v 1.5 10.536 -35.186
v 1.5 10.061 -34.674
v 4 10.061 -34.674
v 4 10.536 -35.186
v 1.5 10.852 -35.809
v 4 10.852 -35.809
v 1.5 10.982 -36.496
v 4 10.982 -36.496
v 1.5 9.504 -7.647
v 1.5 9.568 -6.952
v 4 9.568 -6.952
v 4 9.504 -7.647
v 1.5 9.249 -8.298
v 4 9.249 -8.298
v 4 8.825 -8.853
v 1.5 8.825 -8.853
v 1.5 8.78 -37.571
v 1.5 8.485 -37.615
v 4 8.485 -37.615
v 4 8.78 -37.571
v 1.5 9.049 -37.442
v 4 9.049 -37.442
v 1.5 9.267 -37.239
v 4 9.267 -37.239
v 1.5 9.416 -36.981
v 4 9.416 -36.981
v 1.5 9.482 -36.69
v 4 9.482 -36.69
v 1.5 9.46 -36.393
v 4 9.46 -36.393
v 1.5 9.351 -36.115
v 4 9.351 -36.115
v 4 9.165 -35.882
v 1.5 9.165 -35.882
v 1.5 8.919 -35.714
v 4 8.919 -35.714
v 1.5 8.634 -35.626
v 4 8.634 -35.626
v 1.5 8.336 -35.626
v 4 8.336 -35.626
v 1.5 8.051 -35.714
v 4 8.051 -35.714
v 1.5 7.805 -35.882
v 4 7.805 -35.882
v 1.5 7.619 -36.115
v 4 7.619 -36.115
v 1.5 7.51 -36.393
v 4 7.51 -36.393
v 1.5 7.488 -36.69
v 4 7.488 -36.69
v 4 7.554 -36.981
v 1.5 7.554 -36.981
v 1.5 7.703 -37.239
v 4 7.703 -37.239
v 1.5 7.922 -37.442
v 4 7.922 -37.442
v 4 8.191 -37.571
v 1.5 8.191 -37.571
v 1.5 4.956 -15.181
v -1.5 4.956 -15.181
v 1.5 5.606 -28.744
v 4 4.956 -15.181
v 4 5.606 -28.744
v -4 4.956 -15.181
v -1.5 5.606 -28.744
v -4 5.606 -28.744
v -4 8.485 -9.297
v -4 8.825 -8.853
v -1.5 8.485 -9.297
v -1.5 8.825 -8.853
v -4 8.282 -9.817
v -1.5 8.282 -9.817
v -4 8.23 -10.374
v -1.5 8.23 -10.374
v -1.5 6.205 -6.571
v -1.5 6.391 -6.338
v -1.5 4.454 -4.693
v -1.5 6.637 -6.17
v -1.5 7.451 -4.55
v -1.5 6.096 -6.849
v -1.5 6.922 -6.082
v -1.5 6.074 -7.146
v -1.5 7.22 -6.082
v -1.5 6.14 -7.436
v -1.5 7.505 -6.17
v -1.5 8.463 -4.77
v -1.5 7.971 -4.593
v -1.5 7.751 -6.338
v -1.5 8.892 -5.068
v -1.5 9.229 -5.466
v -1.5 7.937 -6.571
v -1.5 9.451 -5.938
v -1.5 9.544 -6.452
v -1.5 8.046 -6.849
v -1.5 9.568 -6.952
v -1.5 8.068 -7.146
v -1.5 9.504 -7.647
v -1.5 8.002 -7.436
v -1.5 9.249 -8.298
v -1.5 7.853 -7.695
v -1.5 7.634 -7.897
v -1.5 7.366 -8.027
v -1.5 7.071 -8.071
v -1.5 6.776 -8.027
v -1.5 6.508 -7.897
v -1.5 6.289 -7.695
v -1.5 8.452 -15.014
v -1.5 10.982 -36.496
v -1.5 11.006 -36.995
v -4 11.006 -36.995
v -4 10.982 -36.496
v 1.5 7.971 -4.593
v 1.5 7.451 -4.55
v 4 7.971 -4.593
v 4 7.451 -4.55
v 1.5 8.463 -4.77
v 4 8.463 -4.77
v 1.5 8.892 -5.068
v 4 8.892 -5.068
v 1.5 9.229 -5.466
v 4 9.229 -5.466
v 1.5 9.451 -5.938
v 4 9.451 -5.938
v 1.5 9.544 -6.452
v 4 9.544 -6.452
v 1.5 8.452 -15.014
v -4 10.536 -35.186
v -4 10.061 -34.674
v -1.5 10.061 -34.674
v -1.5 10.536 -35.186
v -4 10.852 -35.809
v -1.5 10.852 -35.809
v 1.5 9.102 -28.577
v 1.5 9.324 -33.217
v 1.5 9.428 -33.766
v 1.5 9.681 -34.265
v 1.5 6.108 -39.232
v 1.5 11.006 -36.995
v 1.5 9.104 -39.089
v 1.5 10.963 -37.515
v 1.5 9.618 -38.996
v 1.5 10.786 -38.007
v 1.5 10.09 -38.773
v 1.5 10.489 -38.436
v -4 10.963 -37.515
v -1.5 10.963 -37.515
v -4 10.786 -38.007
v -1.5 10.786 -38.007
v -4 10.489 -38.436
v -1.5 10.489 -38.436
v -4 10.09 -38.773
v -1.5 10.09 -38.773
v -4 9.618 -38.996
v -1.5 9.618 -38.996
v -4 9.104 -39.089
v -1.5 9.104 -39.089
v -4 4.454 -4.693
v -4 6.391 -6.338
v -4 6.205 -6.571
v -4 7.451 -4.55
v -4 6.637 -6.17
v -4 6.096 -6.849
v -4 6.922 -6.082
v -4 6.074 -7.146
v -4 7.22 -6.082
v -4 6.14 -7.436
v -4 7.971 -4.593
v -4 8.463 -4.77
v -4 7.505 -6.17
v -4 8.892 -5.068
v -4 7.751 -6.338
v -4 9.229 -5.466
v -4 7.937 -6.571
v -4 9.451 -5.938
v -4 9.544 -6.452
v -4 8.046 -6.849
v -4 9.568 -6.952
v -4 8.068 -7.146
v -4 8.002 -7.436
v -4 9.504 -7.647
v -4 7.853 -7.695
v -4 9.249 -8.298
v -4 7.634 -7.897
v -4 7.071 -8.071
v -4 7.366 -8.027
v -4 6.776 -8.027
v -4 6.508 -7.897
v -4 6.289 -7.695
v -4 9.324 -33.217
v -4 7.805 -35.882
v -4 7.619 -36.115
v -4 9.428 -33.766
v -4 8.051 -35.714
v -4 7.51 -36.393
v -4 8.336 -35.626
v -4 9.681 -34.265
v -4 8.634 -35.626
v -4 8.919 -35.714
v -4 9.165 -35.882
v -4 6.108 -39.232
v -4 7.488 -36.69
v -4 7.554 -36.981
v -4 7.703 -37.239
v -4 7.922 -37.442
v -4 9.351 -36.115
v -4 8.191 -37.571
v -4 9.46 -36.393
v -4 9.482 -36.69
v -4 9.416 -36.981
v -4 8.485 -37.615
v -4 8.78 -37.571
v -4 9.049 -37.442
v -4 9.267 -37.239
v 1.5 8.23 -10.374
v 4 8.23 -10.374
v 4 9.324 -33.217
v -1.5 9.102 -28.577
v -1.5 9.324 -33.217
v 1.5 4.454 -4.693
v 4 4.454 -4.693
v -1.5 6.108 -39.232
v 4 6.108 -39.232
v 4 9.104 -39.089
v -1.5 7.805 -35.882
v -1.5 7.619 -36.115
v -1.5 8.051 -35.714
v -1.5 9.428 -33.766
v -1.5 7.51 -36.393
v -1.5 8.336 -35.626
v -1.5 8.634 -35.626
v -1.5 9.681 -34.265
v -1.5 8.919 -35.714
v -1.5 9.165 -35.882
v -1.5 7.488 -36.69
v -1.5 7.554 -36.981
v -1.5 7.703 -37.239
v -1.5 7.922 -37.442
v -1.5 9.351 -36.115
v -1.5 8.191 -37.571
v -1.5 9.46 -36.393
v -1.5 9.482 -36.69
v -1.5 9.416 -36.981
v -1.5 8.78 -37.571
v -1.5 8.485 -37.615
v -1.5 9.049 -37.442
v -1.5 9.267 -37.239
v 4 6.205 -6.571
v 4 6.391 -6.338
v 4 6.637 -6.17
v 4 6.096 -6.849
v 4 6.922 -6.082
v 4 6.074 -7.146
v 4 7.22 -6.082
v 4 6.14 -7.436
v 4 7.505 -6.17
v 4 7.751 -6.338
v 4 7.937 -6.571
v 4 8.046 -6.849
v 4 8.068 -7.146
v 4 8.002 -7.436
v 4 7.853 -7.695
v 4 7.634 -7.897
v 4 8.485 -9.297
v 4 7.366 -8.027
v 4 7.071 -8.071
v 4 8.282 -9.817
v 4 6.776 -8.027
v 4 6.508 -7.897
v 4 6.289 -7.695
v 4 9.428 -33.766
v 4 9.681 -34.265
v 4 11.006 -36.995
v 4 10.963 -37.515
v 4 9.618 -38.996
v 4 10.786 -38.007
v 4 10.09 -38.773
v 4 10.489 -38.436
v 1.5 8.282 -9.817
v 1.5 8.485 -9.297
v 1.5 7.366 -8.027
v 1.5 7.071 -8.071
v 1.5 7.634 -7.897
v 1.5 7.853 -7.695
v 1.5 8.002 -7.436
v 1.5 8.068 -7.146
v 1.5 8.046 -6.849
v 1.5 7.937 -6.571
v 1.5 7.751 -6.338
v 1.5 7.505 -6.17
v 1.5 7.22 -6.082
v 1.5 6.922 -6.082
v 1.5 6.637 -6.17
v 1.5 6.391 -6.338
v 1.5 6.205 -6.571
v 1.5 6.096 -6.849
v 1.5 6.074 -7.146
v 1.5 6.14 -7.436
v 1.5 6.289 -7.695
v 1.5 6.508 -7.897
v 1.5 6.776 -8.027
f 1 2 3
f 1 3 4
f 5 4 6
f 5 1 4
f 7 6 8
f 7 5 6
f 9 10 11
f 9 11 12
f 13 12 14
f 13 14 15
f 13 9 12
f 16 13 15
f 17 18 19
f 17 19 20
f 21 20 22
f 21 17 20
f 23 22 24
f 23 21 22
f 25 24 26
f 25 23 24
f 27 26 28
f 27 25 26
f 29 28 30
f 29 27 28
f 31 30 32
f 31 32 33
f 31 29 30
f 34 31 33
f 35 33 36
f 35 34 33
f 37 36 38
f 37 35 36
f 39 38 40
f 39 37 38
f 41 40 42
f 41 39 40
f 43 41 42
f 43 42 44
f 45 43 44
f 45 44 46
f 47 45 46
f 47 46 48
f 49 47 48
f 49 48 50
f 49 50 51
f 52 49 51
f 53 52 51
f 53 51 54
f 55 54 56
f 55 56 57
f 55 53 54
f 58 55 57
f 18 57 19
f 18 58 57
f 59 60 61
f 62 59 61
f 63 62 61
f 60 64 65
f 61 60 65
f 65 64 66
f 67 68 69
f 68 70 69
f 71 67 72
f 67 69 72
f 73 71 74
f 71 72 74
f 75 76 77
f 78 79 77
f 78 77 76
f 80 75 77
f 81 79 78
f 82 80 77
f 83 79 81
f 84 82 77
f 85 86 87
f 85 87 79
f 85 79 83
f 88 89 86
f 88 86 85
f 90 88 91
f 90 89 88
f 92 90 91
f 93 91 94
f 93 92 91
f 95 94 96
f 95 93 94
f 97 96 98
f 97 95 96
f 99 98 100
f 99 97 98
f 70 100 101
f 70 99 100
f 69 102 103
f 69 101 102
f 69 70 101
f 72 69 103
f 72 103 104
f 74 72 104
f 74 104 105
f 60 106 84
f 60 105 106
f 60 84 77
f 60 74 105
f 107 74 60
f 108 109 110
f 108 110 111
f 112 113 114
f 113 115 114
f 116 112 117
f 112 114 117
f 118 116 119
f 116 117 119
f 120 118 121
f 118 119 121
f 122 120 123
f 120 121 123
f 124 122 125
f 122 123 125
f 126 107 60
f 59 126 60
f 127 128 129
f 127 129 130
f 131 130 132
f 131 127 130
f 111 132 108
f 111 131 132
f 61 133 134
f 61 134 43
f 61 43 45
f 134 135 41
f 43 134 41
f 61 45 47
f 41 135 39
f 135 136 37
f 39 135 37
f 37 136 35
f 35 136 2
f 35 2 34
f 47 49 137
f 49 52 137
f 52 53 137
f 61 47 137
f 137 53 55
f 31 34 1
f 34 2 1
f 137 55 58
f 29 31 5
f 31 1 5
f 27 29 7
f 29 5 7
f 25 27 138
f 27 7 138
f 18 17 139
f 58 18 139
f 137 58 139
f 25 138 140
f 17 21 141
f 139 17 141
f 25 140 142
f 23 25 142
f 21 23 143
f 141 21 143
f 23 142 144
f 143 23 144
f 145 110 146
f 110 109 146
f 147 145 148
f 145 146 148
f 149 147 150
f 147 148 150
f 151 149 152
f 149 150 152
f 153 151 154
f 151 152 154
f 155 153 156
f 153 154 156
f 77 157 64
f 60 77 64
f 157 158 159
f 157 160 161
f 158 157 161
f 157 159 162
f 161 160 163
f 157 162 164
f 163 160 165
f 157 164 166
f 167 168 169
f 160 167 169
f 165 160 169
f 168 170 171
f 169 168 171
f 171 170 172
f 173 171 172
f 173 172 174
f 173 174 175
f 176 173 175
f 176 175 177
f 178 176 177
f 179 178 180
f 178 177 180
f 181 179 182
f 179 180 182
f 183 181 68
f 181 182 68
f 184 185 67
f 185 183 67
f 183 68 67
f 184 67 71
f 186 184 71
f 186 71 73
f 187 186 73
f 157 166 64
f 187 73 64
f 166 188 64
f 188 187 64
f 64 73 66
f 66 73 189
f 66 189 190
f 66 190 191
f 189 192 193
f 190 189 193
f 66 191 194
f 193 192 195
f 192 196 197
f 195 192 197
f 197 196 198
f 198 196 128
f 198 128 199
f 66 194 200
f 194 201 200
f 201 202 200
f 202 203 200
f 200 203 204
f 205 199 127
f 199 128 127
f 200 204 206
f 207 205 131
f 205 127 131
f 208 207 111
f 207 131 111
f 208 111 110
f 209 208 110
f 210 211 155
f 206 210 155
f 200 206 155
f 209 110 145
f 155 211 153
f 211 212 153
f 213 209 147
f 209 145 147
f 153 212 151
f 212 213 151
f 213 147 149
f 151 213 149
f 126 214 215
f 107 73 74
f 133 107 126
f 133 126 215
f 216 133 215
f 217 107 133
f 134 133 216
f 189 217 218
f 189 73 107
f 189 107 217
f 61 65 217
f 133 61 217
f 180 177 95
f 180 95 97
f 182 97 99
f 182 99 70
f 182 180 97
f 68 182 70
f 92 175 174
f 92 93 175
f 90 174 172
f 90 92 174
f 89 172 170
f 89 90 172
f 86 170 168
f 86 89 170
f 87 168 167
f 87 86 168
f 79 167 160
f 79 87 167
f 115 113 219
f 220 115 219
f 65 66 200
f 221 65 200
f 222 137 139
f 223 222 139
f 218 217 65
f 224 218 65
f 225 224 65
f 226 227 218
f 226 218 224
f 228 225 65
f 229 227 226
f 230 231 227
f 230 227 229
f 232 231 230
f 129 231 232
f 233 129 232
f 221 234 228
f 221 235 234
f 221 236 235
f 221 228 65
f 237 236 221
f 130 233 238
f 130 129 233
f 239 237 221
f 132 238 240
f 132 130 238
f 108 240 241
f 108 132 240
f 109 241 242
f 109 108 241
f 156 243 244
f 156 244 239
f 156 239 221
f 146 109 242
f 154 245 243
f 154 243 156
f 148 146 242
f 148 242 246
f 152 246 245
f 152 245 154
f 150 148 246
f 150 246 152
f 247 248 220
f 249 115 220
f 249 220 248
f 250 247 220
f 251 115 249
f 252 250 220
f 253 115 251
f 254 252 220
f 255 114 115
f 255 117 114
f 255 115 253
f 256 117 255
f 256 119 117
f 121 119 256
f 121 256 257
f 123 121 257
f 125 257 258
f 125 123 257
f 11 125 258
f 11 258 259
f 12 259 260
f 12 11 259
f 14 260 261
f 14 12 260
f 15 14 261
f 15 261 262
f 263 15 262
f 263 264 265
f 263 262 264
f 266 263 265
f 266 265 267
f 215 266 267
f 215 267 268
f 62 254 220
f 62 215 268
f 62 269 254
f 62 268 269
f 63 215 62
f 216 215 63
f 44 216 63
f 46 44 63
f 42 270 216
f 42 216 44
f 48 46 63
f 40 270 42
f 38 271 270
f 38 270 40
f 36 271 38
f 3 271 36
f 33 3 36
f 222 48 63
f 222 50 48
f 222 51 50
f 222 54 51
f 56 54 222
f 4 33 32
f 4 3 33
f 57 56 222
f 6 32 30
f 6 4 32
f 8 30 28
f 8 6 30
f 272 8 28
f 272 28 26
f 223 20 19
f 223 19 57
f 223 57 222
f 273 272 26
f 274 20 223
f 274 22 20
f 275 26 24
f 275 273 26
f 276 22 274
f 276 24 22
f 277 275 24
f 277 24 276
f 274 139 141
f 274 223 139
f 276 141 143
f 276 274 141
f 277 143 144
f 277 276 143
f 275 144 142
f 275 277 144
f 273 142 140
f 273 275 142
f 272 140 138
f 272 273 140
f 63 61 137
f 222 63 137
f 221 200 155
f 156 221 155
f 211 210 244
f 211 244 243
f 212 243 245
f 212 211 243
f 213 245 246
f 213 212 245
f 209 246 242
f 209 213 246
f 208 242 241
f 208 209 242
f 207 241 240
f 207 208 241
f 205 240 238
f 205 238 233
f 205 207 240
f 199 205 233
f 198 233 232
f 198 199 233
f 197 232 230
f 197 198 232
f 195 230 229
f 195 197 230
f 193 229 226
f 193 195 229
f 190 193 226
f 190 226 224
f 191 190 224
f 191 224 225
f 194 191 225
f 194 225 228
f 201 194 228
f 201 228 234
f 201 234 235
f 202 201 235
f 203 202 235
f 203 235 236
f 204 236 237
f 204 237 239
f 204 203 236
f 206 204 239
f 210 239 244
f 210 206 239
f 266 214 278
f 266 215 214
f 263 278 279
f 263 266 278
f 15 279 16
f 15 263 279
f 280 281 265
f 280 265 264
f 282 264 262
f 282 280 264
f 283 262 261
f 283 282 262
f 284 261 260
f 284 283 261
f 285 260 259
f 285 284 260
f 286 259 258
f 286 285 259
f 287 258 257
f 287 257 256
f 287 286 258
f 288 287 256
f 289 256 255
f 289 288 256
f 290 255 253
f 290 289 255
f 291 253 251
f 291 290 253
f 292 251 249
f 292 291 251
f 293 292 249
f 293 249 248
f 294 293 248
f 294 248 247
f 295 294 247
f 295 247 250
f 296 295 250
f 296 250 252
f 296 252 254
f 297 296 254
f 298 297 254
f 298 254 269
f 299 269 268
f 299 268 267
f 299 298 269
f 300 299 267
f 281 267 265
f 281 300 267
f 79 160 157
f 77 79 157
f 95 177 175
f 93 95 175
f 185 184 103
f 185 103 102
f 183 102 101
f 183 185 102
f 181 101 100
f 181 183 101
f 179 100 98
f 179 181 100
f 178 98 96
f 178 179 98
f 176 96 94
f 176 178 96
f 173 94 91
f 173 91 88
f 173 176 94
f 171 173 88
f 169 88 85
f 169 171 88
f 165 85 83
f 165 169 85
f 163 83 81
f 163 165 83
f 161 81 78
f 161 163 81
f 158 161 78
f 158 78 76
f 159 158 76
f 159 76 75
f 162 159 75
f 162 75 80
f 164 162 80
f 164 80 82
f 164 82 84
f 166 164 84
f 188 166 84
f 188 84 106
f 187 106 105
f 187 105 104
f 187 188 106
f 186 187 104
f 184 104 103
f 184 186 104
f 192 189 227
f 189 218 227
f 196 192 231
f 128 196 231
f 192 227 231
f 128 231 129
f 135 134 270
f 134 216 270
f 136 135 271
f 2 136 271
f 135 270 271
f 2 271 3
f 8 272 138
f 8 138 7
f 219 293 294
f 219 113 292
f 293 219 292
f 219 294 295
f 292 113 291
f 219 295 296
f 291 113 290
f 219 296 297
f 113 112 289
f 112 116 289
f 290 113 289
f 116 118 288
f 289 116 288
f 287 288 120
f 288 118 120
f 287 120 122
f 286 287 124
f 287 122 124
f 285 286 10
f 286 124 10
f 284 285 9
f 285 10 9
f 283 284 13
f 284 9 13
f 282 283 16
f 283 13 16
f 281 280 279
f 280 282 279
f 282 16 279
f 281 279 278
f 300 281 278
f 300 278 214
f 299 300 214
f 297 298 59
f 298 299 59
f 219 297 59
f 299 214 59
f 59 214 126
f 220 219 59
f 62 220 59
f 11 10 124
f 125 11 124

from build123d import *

# Parameters (mm, degrees)
BOSS_EXTRUDE1_DEPTH      = 1.5
BOSS_EXTRUDE1_DEPTH_BACK = 1.5
BOSS_EXTRUDE2_START      = 1.5
SKETCH1_3_R              = 1
BOSS_EXTRUDE2_DEPTH      = 2.5
BOSS_EXTRUDE3_START      = -4
SKETCH1_4_R              = 1
BOSS_EXTRUDE3_DEPTH      = 2.5
FILLET1_R                = 2
CUT_EXTRUDE1_DEPTH       = 41.943081007
CUT_EXTRUDE1_DEPTH_BACK  = 41.943081007
FILLET2_R                = 2


with BuildPart() as part:
    # Sketch1 → Boss-Extrude1 (new, two sides: drawn at the far end of the back side and taken through both)
    with BuildSketch(Plane(origin=(0, 0, 0), x_dir=(0, 0, -1), z_dir=(1, 0, 0)).offset(-BOSS_EXTRUDE1_DEPTH_BACK)):
        Polygon((14.942385879, 9.950712214), (15.181450651, 4.95643068), (28.743963307, 5.605636972), (28.504898535, 10.599918506), align=None)
    extrude(amount=BOSS_EXTRUDE1_DEPTH + BOSS_EXTRUDE1_DEPTH_BACK)

    # Sketch1<3> → Boss-Extrude2 (add)
    with BuildSketch(Plane(origin=(0, 0, 0), x_dir=(0, 0, -1), z_dir=(1, 0, 0)).offset(BOSS_EXTRUDE2_START)):
        Polygon((4.454394659, 9.448676193), (4.693459431, 4.454394659), (39.231954527, 6.107672994), (38.992889755, 11.101954527), align=None)
        with Locations((7.071067812, 7.071067812)):
            Circle(SKETCH1_3_R, mode=Mode.SUBTRACT)
        with Locations((36.615281374, 8.485281374)):
            Circle(SKETCH1_3_R, mode=Mode.SUBTRACT)
    extrude(amount=BOSS_EXTRUDE2_DEPTH)

    # Sketch1<4> → Boss-Extrude3 (add)
    with BuildSketch(Plane(origin=(0, 0, 0), x_dir=(0, 0, -1), z_dir=(1, 0, 0)).offset(BOSS_EXTRUDE3_START)):
        Polygon((4.454394659, 9.448676193), (4.693459431, 4.454394659), (39.231954527, 6.107672994), (38.992889755, 11.101954527), align=None)
        with Locations((7.071067812, 7.071067812)):
            Circle(SKETCH1_4_R, mode=Mode.SUBTRACT)
        with Locations((36.615281374, 8.485281374)):
            Circle(SKETCH1_4_R, mode=Mode.SUBTRACT)
    extrude(amount=BOSS_EXTRUDE3_DEPTH)

    # Fillet1
    fillet1_edges = [part.edges().sort_by_distance(p)[0] for p in [
        (2.75, 11.101954527, -38.992889755),
        (-2.75, 11.101954527, -38.992889755),
        (2.75, 9.448676193, -4.454394659),
        (-2.75, 9.448676193, -4.454394659),
    ]]
    fillet(fillet1_edges, radius=FILLET1_R)

    # Sketch3 → Cut-Extrude1 (cut, two sides: drawn at the far end of the back side and taken through both)
    with BuildSketch(Plane(origin=(0, 0, 0), x_dir=(0, 0, -1), z_dir=(1, 0, 0)).offset(-CUT_EXTRUDE1_DEPTH_BACK)):
        with BuildLine():
            ThreePointArc((6.951535426, 9.568208579), (8.33880017, 9.225796256), (9.311922174, 8.17947736))
            Line((9.311922174, 8.17947736), (34.278801103, 9.37458444))
            ThreePointArc((34.278801103, 9.37458444), (35.147533078, 10.50906865), (36.495748988, 10.982422141))
            Line((36.495748988, 10.982422141), (36.350334975, 14.020253749))
            Line((36.350334975, 14.020253749), (6.806121413, 12.606040186))
            Line((6.806121413, 12.606040186), (6.951535426, 9.568208579))
        make_face()
    extrude(amount=CUT_EXTRUDE1_DEPTH + CUT_EXTRUDE1_DEPTH_BACK, mode=Mode.SUBTRACT)

    # Fillet2
    fillet2_edges = [part.edges().sort_by_distance(p)[0] for p in [
        (2.75, 9.37458444, -34.278801103),
        (-2.75, 9.37458444, -34.278801103),
        (2.75, 8.17947736, -9.311922174),
        (-2.75, 8.17947736, -9.311922174),
    ]]
    fillet(fillet2_edges, radius=FILLET2_R)


solid = part.part
